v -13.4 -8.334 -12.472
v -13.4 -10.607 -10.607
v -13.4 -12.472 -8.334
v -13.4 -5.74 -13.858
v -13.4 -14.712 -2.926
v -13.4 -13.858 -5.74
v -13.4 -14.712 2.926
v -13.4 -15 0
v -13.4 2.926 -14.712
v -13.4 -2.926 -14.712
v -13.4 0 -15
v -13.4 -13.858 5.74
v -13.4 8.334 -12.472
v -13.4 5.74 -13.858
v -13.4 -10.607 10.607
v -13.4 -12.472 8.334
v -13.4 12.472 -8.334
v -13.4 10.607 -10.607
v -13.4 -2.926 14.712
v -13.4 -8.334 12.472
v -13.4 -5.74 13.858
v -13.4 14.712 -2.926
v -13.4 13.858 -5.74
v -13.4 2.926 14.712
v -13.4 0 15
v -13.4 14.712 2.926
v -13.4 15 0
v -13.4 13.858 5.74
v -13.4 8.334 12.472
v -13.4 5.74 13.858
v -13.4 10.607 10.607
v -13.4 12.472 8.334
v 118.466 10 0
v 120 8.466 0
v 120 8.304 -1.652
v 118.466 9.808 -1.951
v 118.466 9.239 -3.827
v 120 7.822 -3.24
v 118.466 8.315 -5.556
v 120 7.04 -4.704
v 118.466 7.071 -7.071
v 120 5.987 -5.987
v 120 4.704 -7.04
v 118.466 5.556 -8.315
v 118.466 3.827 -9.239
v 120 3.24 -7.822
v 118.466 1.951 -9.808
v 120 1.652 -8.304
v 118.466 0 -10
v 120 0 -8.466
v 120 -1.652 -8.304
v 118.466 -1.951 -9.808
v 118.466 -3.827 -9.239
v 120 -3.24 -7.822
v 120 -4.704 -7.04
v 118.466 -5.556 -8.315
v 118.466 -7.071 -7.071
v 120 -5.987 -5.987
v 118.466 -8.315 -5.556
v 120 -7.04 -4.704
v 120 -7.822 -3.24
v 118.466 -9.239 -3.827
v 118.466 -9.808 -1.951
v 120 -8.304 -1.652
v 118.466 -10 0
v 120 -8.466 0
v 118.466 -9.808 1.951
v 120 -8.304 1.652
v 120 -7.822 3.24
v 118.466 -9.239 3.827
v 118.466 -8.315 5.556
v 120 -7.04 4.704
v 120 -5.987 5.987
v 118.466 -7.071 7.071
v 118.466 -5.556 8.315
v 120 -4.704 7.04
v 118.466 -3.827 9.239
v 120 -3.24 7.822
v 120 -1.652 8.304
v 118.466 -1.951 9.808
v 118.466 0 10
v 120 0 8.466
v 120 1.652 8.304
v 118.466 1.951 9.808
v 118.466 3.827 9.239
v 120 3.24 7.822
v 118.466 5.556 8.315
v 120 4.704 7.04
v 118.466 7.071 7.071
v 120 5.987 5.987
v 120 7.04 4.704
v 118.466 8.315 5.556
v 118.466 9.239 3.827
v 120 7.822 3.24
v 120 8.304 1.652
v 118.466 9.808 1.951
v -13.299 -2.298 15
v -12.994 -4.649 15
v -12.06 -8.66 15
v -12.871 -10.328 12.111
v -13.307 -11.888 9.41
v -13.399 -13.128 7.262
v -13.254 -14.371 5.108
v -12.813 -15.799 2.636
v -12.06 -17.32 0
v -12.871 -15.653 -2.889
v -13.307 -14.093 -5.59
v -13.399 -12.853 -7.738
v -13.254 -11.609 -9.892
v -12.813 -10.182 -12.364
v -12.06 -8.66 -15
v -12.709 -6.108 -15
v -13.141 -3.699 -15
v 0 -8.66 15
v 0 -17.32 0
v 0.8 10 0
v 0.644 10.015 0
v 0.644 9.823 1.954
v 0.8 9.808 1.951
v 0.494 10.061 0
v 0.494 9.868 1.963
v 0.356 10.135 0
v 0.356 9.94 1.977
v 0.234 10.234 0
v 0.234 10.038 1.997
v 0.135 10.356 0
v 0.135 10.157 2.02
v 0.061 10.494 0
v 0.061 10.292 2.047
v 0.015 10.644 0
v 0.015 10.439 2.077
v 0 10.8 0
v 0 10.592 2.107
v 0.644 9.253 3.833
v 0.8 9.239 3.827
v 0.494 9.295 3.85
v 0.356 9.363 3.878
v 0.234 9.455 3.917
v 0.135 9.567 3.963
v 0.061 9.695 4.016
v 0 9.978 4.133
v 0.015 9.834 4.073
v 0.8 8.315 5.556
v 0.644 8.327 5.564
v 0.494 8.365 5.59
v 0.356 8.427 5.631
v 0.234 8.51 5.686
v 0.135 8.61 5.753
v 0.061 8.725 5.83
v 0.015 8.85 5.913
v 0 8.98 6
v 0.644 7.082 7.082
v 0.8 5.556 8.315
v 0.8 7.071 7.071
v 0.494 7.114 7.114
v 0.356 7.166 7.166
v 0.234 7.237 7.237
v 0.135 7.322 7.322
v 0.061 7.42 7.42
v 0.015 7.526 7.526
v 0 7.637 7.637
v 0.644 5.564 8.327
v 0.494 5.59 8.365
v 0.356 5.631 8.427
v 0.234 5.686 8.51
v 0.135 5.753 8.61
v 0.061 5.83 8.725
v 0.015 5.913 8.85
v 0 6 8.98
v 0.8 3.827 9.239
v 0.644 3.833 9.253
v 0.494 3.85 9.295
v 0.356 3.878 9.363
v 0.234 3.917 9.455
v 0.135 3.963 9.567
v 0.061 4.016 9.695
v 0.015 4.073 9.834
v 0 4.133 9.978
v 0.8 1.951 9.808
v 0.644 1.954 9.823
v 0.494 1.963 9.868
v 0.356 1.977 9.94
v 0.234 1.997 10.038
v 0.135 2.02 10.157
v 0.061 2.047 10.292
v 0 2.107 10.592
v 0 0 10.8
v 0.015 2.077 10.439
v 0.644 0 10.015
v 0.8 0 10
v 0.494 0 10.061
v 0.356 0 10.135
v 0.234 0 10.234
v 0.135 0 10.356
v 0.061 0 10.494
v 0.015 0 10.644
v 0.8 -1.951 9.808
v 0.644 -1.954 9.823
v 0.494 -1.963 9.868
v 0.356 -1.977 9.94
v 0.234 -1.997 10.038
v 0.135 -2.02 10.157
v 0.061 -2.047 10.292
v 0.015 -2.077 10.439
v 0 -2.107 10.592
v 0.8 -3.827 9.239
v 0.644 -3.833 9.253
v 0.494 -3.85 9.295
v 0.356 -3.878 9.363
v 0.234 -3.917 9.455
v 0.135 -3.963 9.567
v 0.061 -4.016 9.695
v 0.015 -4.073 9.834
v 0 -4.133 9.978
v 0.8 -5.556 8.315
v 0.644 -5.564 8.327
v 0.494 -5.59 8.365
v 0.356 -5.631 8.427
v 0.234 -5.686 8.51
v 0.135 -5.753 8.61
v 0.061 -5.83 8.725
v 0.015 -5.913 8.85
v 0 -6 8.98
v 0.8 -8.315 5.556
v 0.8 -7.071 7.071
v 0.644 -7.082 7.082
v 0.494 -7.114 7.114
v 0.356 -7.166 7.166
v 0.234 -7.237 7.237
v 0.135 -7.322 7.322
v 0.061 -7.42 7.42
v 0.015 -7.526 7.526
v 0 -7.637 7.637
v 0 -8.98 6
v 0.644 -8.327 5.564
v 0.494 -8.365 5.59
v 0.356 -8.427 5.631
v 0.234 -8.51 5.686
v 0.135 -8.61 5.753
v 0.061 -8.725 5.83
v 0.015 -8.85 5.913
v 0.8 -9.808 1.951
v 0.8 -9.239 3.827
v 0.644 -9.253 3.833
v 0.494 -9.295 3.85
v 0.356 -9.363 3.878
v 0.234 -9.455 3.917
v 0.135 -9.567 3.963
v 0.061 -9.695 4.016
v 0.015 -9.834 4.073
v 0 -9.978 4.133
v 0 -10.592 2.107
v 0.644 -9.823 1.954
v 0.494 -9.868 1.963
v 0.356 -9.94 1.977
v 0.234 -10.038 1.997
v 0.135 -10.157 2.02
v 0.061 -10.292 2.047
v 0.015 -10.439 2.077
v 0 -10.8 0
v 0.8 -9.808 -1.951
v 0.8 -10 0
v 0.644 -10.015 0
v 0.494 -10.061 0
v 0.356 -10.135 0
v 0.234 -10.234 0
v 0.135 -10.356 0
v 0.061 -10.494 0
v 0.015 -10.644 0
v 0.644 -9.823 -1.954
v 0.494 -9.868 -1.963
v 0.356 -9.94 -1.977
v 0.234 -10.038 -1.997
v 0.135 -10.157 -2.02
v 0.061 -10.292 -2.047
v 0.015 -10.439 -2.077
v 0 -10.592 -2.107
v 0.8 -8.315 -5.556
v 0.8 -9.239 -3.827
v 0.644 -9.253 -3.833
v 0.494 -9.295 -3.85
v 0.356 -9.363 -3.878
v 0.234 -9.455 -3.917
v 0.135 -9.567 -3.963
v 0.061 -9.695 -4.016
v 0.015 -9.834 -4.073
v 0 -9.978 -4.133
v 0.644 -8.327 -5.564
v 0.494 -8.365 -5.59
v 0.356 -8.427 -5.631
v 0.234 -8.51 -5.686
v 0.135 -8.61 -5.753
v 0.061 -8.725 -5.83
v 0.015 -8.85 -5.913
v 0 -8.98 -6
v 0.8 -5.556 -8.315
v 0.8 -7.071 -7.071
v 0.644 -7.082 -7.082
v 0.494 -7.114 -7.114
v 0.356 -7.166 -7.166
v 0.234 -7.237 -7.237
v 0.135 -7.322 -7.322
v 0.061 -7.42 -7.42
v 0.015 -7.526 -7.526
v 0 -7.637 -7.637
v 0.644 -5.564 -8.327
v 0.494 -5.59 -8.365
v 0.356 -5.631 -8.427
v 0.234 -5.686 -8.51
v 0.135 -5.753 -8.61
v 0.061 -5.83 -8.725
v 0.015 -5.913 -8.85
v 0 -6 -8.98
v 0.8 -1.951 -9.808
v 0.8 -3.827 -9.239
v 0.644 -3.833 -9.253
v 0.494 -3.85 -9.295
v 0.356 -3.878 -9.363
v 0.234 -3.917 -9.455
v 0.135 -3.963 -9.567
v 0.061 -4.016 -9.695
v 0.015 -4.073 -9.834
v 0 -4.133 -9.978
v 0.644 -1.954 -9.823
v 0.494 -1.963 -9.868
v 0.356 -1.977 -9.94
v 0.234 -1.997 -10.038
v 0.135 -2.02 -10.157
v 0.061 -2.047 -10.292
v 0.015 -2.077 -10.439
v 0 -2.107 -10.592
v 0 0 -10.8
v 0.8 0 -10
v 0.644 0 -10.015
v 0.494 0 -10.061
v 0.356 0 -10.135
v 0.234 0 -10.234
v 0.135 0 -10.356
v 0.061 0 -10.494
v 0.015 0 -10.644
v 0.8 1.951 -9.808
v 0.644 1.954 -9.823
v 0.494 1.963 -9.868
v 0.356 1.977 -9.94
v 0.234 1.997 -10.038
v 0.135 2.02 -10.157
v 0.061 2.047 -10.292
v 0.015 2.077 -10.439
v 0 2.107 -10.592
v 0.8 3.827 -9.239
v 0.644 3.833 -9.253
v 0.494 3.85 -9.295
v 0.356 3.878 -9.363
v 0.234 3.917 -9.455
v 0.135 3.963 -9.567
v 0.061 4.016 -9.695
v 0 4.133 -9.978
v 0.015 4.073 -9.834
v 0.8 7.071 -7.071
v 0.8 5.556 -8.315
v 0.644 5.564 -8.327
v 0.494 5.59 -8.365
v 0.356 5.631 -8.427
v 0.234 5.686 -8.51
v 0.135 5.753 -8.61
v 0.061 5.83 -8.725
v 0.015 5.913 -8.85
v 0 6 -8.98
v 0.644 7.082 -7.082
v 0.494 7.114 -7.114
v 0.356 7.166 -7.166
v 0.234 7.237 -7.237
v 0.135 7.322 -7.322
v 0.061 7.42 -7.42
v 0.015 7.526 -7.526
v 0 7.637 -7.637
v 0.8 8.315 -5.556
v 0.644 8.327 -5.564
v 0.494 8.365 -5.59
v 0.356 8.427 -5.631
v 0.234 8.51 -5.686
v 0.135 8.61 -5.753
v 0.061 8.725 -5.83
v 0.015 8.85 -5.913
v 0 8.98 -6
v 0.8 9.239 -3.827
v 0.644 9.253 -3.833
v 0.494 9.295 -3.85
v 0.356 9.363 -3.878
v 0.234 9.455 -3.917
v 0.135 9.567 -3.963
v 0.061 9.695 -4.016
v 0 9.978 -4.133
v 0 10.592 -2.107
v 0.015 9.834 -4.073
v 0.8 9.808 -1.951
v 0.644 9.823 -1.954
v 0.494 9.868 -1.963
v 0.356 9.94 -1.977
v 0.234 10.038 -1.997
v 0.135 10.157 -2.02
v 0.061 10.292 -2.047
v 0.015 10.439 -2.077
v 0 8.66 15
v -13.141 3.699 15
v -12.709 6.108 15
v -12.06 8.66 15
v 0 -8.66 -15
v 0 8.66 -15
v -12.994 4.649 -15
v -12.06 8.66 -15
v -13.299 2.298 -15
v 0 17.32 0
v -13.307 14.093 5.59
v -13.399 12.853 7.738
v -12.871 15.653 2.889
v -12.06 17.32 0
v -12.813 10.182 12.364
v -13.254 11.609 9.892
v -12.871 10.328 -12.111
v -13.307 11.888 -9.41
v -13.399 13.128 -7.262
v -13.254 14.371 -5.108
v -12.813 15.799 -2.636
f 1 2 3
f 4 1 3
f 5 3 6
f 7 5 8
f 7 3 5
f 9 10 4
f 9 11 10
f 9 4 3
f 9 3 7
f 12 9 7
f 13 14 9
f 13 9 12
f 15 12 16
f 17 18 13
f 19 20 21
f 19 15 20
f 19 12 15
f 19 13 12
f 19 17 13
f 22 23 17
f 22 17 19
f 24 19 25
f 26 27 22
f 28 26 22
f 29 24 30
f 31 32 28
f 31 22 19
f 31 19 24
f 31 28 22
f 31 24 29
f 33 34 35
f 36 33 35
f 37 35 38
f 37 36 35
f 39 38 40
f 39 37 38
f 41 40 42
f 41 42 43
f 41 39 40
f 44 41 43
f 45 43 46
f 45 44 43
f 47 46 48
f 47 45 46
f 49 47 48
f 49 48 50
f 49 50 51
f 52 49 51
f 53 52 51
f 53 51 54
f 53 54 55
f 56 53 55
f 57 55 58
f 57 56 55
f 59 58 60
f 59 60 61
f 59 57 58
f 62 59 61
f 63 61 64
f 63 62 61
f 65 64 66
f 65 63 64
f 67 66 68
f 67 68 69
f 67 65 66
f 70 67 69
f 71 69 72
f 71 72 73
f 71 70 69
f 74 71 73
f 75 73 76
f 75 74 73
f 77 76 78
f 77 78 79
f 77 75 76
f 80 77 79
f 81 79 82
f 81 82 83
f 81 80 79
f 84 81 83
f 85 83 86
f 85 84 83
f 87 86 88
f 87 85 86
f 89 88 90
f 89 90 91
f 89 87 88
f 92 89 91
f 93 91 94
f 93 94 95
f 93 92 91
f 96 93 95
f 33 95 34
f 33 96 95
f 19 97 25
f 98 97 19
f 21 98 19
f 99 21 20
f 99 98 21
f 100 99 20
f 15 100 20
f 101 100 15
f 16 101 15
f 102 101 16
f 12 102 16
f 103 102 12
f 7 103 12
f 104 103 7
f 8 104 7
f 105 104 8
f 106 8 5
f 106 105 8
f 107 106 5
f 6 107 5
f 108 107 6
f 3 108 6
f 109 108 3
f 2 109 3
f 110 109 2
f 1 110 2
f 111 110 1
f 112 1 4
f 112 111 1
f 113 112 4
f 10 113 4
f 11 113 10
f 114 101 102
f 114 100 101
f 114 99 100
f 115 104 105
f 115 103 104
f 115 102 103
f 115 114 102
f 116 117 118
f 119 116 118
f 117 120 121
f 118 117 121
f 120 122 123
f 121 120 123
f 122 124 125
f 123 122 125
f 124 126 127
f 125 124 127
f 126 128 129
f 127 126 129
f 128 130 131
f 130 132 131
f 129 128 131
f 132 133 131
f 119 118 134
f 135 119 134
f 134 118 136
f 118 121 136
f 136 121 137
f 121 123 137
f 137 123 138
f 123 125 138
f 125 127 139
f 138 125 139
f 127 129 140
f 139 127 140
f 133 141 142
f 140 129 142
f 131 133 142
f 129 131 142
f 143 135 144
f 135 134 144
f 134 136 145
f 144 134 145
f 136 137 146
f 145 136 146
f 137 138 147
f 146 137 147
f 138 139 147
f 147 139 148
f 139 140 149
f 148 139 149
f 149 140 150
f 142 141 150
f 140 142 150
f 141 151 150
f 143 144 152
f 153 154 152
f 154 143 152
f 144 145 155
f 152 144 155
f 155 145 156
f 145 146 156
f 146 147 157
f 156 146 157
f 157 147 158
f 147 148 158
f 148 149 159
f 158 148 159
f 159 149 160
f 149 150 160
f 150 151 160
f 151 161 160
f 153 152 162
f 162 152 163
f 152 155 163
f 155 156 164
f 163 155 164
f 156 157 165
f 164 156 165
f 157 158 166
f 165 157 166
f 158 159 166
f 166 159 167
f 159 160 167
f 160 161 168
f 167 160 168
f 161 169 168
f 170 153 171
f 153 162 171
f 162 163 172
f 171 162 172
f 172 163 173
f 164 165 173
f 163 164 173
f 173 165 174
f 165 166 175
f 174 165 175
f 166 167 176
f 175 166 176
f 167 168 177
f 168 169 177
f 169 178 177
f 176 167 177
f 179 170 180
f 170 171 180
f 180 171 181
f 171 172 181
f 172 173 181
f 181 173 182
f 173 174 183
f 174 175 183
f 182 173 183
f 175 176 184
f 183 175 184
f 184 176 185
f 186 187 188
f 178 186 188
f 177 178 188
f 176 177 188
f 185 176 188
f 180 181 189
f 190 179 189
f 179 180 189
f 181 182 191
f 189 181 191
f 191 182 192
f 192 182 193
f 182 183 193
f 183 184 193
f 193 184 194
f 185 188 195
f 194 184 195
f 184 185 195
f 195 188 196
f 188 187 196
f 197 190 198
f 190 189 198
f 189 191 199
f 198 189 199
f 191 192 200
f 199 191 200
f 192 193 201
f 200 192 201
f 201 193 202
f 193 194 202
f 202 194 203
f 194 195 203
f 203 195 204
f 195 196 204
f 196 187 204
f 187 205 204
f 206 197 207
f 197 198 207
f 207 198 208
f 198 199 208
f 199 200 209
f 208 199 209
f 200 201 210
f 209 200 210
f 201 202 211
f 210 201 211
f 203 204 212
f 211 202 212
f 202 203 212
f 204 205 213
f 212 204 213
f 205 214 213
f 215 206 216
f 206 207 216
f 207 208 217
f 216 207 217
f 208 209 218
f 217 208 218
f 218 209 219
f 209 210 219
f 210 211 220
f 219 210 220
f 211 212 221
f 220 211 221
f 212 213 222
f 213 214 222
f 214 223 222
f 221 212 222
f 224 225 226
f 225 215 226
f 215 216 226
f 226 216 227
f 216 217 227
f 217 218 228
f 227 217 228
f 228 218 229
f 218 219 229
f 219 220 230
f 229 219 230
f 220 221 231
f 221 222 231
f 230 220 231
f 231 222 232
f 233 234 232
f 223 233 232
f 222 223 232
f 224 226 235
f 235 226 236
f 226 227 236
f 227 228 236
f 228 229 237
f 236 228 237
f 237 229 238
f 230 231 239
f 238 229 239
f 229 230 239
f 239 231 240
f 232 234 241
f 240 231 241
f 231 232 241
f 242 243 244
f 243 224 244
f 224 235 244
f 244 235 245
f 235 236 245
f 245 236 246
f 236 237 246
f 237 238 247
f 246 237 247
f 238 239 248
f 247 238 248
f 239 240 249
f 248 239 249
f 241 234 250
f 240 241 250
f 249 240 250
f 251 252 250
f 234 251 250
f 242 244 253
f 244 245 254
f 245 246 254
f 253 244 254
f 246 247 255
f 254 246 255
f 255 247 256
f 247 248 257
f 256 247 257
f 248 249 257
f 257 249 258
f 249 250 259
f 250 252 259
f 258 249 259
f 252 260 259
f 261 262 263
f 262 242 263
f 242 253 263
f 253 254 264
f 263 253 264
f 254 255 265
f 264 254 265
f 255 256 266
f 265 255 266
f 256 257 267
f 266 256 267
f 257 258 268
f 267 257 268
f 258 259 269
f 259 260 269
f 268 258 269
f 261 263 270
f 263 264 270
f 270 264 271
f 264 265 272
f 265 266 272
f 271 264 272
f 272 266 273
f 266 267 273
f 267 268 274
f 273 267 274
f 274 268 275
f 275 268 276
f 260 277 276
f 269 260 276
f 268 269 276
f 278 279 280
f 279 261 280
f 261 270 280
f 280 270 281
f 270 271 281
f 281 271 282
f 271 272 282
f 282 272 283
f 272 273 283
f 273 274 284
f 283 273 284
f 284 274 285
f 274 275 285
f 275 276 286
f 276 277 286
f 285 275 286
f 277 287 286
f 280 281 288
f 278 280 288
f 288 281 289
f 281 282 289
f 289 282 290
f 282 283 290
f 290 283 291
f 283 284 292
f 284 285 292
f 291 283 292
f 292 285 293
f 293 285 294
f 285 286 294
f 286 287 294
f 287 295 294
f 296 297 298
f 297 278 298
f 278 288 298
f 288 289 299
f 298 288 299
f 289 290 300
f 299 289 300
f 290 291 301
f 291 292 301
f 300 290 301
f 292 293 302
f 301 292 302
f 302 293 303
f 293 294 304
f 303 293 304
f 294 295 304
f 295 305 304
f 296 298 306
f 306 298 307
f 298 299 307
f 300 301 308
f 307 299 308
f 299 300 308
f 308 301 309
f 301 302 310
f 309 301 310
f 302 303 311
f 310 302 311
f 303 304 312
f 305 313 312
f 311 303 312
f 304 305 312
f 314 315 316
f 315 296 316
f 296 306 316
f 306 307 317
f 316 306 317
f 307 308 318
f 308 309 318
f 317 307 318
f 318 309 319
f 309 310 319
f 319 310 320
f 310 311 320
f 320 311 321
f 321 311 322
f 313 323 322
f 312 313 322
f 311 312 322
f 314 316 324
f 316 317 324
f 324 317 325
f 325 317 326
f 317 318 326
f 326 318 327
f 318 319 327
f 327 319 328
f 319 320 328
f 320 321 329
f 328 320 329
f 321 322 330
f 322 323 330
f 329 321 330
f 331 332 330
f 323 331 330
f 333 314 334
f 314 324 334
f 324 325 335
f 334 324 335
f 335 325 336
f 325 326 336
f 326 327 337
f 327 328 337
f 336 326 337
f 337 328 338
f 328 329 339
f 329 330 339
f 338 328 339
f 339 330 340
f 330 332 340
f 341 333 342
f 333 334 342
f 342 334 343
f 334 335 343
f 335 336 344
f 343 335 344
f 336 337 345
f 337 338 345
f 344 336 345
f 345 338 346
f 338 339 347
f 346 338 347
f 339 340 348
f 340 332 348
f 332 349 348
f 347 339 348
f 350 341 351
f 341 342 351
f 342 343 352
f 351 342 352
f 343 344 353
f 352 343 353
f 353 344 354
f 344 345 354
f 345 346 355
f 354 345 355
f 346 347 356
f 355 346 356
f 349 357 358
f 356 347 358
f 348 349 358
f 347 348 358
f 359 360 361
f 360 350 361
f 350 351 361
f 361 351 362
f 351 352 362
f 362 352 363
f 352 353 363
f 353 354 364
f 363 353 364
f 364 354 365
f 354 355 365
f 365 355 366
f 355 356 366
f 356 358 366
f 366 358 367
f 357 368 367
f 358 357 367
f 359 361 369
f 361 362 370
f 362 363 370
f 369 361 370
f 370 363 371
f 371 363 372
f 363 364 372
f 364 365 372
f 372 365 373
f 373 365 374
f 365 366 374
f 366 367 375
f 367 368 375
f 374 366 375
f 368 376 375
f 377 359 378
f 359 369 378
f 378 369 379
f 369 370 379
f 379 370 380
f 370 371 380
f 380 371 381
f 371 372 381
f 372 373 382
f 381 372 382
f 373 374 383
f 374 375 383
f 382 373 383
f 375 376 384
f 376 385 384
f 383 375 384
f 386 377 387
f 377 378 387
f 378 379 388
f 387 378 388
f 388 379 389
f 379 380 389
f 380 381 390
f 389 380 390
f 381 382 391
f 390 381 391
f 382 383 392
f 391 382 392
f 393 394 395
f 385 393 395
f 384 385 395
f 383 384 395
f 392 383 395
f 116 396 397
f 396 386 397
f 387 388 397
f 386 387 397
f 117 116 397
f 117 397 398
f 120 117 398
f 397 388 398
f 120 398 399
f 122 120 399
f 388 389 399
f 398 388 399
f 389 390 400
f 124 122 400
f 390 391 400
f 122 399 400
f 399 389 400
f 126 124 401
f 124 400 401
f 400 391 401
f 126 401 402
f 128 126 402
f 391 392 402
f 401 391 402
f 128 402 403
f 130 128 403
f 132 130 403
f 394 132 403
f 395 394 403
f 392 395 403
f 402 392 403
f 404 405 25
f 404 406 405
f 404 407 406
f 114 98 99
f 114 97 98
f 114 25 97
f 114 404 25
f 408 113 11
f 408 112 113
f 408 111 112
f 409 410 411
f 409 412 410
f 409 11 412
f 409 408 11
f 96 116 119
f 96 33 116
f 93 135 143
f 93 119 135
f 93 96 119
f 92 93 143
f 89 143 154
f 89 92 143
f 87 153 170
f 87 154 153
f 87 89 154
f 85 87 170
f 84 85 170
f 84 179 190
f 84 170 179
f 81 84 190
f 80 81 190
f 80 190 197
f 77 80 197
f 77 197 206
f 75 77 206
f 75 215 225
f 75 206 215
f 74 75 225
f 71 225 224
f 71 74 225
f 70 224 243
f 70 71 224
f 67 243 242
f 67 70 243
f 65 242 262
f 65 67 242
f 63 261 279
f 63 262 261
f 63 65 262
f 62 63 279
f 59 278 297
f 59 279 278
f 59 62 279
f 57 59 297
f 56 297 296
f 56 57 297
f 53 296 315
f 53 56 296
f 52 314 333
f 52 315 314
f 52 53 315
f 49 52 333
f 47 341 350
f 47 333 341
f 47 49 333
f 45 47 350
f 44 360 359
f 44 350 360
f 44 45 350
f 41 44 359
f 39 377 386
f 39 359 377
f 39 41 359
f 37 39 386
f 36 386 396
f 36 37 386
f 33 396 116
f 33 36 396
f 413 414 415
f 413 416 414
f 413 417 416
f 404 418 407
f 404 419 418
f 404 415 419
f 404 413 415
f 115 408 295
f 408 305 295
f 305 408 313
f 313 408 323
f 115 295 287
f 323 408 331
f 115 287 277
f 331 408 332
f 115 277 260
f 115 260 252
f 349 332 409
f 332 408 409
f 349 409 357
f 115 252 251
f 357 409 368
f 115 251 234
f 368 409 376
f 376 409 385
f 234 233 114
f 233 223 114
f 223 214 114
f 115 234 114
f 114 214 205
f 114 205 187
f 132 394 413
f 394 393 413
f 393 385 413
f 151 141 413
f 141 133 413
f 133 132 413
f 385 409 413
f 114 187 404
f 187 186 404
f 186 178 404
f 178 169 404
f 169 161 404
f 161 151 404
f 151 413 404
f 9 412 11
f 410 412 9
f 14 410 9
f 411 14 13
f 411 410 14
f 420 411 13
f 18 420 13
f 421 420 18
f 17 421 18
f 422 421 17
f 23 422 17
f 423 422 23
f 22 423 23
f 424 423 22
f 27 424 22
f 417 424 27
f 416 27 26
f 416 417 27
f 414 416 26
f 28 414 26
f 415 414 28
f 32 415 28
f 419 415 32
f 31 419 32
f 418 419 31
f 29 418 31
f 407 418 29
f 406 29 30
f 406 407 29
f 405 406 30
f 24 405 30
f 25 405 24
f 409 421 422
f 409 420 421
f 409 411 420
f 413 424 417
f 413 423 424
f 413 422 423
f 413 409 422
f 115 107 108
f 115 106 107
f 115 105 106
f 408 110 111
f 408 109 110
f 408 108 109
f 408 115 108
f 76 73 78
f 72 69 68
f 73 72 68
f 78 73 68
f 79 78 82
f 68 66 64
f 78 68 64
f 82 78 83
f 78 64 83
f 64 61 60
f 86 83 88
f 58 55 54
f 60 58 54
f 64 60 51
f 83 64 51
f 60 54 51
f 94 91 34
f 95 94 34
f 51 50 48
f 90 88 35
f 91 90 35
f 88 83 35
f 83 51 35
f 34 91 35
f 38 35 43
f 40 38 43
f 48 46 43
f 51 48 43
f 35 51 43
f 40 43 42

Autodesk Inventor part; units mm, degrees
ref_plane "YZ Plane" through (0, 0, 0) normal (1, 0, 0) x (0, 1, 0)
ref_plane "XZ Plane" through (0, 0, 0) normal (0, 1, 0) x (-1, 0, 0)
sketch "Sketch1" plane through (0, 0, 0) normal (0, 0, 1) x (1, 0, 0)
  line L0 (0, 10) -> (120, 10)
  line L1 (120, 10) -> (120, 0)
  line L2 (120, 0) -> (0, 0)
  line L3 (-24, 0) -> (144, 0) projected
  line L4 (0, -2) -> (0, 12) projected
  line L5 (0, 10) -> (0, 0)
  dimension "d2" = 20
  dimension "d59" = 120
revolve "Body" add sketch "Sketch1" angle 360 about axis through (120, 0, 0) along (-1, 0, 0)
sketch "Sketch2" plane through (0, 0, 0) normal (-1, 0, 0) x (0, 0, 1)
  line L0 (0, 17.3205) -> (15, 8.6603)
  line L1 (15, 8.6603) -> (15, -8.6603)
  line L2 (15, -8.6603) -> (0, -17.3205)
  line L3 (0, -17.3205) -> (-15, -8.6603)
  line L4 (-15, -8.6603) -> (-15, 8.6603)
  line L5 (-15, 8.6603) -> (0, 17.3205)
  line L6 (-21, 0) -> (21, 0) projected
  line L7 (0, 24.2487) -> (0, -24.2487) projected
  point P0 (0, 0)
  point P1 (0, 0)
  dimension "d11" = 30
extrude "Head" add sketch "Sketch2" along normal blind 13.4
sketch "Sketch4" plane through (0, 0, 0) normal (0, 0, 1) x (1, 0, 0)
  line L0 (-11.6679, 18) -> (-13.4, 15)
  line L1 (-1.1, 0) -> (-0.234, 0)
  line L2 (-16.0332, 0) -> (2.3992, 0) projected
  line L3 (-13.4, 18) -> (-11.6679, 18)
  line L4 (-13.4, 15) -> (-13.4, 18)
  line L5 (0, 21.6) -> (0, -3.6) projected
  dimension "d65" = 30
  dimension "d67" = 30
  dimension "d68" = 36
  dimension "d69" = 13.4
revolve "Chamfer1" cut sketch "Sketch4" angle 360 about axis through (-1.1, 0, 0) along (1, 0, 0)
thread "Thread" size "M20x2.5" class "6g" standard "ISO Metric profile" length 46
chamfer "Chamfer2" distance 1.5336 distance2 1.5337 1 edges at (120, -10, 0) measured on face at (120, -2.6738, -2.9356)
fillet "Fillet" radius 0.8 1 edges at (0, -10, 0)
ref_plane "Work Plane1" through (1.525, 0, 0) normal (0, 0, 1) x (1, 0, 0)
equation "\"d2\" = GD"
equation "\"d59\" = NLG"
equation "\"d11\" = SW"
equation "\"d3\" = KOH"
equation "\"d15\" = GEL"
equation "\"d6\" = -0.5 * SPD + 0.5 * GD"
equation "\"d71\" = RR1"
equation "\"d65\" = SW"
equation "\"d67\" = ANG1"
equation "\"d68\" = 1.2 * SW"
equation "\"d69\" = KOH"
equation "\"NLG\" = 120"
equation "\"GD\" = NND"
equation "\"KOH\" = 13.4"
equation "\"GEL\" = 46"
equation "\"SW\" = 30"
equation "\"SPD\" = NND - 1.2269 * PTC"
equation "\"SD\" = 0"
equation "\"ANG1\" = 30deg"
equation "\"GAL\" = 0.61345 * PTC"
equation "\"GUL\" = 0.61345 * PTC"
equation "\"RR\" = 0.1"
equation "\"RR1\" = 0.8"
equation "\"GD1\" = THREADDIA - 1.2269 * PTC"
equation "\"TOA\" = 30deg"
equation "\"PTC\" = 2.5"
equation "\"KOH1\" = 8.8"
equation "\"E0\" = 1.155 * SW"
equation "\"NND\" = 20"
equation "\"THREADDIA\" = 20"
properties part number "ANSI B18.2.3.5M - M20 x 2,5 x 120" material "Steel, Mild"
